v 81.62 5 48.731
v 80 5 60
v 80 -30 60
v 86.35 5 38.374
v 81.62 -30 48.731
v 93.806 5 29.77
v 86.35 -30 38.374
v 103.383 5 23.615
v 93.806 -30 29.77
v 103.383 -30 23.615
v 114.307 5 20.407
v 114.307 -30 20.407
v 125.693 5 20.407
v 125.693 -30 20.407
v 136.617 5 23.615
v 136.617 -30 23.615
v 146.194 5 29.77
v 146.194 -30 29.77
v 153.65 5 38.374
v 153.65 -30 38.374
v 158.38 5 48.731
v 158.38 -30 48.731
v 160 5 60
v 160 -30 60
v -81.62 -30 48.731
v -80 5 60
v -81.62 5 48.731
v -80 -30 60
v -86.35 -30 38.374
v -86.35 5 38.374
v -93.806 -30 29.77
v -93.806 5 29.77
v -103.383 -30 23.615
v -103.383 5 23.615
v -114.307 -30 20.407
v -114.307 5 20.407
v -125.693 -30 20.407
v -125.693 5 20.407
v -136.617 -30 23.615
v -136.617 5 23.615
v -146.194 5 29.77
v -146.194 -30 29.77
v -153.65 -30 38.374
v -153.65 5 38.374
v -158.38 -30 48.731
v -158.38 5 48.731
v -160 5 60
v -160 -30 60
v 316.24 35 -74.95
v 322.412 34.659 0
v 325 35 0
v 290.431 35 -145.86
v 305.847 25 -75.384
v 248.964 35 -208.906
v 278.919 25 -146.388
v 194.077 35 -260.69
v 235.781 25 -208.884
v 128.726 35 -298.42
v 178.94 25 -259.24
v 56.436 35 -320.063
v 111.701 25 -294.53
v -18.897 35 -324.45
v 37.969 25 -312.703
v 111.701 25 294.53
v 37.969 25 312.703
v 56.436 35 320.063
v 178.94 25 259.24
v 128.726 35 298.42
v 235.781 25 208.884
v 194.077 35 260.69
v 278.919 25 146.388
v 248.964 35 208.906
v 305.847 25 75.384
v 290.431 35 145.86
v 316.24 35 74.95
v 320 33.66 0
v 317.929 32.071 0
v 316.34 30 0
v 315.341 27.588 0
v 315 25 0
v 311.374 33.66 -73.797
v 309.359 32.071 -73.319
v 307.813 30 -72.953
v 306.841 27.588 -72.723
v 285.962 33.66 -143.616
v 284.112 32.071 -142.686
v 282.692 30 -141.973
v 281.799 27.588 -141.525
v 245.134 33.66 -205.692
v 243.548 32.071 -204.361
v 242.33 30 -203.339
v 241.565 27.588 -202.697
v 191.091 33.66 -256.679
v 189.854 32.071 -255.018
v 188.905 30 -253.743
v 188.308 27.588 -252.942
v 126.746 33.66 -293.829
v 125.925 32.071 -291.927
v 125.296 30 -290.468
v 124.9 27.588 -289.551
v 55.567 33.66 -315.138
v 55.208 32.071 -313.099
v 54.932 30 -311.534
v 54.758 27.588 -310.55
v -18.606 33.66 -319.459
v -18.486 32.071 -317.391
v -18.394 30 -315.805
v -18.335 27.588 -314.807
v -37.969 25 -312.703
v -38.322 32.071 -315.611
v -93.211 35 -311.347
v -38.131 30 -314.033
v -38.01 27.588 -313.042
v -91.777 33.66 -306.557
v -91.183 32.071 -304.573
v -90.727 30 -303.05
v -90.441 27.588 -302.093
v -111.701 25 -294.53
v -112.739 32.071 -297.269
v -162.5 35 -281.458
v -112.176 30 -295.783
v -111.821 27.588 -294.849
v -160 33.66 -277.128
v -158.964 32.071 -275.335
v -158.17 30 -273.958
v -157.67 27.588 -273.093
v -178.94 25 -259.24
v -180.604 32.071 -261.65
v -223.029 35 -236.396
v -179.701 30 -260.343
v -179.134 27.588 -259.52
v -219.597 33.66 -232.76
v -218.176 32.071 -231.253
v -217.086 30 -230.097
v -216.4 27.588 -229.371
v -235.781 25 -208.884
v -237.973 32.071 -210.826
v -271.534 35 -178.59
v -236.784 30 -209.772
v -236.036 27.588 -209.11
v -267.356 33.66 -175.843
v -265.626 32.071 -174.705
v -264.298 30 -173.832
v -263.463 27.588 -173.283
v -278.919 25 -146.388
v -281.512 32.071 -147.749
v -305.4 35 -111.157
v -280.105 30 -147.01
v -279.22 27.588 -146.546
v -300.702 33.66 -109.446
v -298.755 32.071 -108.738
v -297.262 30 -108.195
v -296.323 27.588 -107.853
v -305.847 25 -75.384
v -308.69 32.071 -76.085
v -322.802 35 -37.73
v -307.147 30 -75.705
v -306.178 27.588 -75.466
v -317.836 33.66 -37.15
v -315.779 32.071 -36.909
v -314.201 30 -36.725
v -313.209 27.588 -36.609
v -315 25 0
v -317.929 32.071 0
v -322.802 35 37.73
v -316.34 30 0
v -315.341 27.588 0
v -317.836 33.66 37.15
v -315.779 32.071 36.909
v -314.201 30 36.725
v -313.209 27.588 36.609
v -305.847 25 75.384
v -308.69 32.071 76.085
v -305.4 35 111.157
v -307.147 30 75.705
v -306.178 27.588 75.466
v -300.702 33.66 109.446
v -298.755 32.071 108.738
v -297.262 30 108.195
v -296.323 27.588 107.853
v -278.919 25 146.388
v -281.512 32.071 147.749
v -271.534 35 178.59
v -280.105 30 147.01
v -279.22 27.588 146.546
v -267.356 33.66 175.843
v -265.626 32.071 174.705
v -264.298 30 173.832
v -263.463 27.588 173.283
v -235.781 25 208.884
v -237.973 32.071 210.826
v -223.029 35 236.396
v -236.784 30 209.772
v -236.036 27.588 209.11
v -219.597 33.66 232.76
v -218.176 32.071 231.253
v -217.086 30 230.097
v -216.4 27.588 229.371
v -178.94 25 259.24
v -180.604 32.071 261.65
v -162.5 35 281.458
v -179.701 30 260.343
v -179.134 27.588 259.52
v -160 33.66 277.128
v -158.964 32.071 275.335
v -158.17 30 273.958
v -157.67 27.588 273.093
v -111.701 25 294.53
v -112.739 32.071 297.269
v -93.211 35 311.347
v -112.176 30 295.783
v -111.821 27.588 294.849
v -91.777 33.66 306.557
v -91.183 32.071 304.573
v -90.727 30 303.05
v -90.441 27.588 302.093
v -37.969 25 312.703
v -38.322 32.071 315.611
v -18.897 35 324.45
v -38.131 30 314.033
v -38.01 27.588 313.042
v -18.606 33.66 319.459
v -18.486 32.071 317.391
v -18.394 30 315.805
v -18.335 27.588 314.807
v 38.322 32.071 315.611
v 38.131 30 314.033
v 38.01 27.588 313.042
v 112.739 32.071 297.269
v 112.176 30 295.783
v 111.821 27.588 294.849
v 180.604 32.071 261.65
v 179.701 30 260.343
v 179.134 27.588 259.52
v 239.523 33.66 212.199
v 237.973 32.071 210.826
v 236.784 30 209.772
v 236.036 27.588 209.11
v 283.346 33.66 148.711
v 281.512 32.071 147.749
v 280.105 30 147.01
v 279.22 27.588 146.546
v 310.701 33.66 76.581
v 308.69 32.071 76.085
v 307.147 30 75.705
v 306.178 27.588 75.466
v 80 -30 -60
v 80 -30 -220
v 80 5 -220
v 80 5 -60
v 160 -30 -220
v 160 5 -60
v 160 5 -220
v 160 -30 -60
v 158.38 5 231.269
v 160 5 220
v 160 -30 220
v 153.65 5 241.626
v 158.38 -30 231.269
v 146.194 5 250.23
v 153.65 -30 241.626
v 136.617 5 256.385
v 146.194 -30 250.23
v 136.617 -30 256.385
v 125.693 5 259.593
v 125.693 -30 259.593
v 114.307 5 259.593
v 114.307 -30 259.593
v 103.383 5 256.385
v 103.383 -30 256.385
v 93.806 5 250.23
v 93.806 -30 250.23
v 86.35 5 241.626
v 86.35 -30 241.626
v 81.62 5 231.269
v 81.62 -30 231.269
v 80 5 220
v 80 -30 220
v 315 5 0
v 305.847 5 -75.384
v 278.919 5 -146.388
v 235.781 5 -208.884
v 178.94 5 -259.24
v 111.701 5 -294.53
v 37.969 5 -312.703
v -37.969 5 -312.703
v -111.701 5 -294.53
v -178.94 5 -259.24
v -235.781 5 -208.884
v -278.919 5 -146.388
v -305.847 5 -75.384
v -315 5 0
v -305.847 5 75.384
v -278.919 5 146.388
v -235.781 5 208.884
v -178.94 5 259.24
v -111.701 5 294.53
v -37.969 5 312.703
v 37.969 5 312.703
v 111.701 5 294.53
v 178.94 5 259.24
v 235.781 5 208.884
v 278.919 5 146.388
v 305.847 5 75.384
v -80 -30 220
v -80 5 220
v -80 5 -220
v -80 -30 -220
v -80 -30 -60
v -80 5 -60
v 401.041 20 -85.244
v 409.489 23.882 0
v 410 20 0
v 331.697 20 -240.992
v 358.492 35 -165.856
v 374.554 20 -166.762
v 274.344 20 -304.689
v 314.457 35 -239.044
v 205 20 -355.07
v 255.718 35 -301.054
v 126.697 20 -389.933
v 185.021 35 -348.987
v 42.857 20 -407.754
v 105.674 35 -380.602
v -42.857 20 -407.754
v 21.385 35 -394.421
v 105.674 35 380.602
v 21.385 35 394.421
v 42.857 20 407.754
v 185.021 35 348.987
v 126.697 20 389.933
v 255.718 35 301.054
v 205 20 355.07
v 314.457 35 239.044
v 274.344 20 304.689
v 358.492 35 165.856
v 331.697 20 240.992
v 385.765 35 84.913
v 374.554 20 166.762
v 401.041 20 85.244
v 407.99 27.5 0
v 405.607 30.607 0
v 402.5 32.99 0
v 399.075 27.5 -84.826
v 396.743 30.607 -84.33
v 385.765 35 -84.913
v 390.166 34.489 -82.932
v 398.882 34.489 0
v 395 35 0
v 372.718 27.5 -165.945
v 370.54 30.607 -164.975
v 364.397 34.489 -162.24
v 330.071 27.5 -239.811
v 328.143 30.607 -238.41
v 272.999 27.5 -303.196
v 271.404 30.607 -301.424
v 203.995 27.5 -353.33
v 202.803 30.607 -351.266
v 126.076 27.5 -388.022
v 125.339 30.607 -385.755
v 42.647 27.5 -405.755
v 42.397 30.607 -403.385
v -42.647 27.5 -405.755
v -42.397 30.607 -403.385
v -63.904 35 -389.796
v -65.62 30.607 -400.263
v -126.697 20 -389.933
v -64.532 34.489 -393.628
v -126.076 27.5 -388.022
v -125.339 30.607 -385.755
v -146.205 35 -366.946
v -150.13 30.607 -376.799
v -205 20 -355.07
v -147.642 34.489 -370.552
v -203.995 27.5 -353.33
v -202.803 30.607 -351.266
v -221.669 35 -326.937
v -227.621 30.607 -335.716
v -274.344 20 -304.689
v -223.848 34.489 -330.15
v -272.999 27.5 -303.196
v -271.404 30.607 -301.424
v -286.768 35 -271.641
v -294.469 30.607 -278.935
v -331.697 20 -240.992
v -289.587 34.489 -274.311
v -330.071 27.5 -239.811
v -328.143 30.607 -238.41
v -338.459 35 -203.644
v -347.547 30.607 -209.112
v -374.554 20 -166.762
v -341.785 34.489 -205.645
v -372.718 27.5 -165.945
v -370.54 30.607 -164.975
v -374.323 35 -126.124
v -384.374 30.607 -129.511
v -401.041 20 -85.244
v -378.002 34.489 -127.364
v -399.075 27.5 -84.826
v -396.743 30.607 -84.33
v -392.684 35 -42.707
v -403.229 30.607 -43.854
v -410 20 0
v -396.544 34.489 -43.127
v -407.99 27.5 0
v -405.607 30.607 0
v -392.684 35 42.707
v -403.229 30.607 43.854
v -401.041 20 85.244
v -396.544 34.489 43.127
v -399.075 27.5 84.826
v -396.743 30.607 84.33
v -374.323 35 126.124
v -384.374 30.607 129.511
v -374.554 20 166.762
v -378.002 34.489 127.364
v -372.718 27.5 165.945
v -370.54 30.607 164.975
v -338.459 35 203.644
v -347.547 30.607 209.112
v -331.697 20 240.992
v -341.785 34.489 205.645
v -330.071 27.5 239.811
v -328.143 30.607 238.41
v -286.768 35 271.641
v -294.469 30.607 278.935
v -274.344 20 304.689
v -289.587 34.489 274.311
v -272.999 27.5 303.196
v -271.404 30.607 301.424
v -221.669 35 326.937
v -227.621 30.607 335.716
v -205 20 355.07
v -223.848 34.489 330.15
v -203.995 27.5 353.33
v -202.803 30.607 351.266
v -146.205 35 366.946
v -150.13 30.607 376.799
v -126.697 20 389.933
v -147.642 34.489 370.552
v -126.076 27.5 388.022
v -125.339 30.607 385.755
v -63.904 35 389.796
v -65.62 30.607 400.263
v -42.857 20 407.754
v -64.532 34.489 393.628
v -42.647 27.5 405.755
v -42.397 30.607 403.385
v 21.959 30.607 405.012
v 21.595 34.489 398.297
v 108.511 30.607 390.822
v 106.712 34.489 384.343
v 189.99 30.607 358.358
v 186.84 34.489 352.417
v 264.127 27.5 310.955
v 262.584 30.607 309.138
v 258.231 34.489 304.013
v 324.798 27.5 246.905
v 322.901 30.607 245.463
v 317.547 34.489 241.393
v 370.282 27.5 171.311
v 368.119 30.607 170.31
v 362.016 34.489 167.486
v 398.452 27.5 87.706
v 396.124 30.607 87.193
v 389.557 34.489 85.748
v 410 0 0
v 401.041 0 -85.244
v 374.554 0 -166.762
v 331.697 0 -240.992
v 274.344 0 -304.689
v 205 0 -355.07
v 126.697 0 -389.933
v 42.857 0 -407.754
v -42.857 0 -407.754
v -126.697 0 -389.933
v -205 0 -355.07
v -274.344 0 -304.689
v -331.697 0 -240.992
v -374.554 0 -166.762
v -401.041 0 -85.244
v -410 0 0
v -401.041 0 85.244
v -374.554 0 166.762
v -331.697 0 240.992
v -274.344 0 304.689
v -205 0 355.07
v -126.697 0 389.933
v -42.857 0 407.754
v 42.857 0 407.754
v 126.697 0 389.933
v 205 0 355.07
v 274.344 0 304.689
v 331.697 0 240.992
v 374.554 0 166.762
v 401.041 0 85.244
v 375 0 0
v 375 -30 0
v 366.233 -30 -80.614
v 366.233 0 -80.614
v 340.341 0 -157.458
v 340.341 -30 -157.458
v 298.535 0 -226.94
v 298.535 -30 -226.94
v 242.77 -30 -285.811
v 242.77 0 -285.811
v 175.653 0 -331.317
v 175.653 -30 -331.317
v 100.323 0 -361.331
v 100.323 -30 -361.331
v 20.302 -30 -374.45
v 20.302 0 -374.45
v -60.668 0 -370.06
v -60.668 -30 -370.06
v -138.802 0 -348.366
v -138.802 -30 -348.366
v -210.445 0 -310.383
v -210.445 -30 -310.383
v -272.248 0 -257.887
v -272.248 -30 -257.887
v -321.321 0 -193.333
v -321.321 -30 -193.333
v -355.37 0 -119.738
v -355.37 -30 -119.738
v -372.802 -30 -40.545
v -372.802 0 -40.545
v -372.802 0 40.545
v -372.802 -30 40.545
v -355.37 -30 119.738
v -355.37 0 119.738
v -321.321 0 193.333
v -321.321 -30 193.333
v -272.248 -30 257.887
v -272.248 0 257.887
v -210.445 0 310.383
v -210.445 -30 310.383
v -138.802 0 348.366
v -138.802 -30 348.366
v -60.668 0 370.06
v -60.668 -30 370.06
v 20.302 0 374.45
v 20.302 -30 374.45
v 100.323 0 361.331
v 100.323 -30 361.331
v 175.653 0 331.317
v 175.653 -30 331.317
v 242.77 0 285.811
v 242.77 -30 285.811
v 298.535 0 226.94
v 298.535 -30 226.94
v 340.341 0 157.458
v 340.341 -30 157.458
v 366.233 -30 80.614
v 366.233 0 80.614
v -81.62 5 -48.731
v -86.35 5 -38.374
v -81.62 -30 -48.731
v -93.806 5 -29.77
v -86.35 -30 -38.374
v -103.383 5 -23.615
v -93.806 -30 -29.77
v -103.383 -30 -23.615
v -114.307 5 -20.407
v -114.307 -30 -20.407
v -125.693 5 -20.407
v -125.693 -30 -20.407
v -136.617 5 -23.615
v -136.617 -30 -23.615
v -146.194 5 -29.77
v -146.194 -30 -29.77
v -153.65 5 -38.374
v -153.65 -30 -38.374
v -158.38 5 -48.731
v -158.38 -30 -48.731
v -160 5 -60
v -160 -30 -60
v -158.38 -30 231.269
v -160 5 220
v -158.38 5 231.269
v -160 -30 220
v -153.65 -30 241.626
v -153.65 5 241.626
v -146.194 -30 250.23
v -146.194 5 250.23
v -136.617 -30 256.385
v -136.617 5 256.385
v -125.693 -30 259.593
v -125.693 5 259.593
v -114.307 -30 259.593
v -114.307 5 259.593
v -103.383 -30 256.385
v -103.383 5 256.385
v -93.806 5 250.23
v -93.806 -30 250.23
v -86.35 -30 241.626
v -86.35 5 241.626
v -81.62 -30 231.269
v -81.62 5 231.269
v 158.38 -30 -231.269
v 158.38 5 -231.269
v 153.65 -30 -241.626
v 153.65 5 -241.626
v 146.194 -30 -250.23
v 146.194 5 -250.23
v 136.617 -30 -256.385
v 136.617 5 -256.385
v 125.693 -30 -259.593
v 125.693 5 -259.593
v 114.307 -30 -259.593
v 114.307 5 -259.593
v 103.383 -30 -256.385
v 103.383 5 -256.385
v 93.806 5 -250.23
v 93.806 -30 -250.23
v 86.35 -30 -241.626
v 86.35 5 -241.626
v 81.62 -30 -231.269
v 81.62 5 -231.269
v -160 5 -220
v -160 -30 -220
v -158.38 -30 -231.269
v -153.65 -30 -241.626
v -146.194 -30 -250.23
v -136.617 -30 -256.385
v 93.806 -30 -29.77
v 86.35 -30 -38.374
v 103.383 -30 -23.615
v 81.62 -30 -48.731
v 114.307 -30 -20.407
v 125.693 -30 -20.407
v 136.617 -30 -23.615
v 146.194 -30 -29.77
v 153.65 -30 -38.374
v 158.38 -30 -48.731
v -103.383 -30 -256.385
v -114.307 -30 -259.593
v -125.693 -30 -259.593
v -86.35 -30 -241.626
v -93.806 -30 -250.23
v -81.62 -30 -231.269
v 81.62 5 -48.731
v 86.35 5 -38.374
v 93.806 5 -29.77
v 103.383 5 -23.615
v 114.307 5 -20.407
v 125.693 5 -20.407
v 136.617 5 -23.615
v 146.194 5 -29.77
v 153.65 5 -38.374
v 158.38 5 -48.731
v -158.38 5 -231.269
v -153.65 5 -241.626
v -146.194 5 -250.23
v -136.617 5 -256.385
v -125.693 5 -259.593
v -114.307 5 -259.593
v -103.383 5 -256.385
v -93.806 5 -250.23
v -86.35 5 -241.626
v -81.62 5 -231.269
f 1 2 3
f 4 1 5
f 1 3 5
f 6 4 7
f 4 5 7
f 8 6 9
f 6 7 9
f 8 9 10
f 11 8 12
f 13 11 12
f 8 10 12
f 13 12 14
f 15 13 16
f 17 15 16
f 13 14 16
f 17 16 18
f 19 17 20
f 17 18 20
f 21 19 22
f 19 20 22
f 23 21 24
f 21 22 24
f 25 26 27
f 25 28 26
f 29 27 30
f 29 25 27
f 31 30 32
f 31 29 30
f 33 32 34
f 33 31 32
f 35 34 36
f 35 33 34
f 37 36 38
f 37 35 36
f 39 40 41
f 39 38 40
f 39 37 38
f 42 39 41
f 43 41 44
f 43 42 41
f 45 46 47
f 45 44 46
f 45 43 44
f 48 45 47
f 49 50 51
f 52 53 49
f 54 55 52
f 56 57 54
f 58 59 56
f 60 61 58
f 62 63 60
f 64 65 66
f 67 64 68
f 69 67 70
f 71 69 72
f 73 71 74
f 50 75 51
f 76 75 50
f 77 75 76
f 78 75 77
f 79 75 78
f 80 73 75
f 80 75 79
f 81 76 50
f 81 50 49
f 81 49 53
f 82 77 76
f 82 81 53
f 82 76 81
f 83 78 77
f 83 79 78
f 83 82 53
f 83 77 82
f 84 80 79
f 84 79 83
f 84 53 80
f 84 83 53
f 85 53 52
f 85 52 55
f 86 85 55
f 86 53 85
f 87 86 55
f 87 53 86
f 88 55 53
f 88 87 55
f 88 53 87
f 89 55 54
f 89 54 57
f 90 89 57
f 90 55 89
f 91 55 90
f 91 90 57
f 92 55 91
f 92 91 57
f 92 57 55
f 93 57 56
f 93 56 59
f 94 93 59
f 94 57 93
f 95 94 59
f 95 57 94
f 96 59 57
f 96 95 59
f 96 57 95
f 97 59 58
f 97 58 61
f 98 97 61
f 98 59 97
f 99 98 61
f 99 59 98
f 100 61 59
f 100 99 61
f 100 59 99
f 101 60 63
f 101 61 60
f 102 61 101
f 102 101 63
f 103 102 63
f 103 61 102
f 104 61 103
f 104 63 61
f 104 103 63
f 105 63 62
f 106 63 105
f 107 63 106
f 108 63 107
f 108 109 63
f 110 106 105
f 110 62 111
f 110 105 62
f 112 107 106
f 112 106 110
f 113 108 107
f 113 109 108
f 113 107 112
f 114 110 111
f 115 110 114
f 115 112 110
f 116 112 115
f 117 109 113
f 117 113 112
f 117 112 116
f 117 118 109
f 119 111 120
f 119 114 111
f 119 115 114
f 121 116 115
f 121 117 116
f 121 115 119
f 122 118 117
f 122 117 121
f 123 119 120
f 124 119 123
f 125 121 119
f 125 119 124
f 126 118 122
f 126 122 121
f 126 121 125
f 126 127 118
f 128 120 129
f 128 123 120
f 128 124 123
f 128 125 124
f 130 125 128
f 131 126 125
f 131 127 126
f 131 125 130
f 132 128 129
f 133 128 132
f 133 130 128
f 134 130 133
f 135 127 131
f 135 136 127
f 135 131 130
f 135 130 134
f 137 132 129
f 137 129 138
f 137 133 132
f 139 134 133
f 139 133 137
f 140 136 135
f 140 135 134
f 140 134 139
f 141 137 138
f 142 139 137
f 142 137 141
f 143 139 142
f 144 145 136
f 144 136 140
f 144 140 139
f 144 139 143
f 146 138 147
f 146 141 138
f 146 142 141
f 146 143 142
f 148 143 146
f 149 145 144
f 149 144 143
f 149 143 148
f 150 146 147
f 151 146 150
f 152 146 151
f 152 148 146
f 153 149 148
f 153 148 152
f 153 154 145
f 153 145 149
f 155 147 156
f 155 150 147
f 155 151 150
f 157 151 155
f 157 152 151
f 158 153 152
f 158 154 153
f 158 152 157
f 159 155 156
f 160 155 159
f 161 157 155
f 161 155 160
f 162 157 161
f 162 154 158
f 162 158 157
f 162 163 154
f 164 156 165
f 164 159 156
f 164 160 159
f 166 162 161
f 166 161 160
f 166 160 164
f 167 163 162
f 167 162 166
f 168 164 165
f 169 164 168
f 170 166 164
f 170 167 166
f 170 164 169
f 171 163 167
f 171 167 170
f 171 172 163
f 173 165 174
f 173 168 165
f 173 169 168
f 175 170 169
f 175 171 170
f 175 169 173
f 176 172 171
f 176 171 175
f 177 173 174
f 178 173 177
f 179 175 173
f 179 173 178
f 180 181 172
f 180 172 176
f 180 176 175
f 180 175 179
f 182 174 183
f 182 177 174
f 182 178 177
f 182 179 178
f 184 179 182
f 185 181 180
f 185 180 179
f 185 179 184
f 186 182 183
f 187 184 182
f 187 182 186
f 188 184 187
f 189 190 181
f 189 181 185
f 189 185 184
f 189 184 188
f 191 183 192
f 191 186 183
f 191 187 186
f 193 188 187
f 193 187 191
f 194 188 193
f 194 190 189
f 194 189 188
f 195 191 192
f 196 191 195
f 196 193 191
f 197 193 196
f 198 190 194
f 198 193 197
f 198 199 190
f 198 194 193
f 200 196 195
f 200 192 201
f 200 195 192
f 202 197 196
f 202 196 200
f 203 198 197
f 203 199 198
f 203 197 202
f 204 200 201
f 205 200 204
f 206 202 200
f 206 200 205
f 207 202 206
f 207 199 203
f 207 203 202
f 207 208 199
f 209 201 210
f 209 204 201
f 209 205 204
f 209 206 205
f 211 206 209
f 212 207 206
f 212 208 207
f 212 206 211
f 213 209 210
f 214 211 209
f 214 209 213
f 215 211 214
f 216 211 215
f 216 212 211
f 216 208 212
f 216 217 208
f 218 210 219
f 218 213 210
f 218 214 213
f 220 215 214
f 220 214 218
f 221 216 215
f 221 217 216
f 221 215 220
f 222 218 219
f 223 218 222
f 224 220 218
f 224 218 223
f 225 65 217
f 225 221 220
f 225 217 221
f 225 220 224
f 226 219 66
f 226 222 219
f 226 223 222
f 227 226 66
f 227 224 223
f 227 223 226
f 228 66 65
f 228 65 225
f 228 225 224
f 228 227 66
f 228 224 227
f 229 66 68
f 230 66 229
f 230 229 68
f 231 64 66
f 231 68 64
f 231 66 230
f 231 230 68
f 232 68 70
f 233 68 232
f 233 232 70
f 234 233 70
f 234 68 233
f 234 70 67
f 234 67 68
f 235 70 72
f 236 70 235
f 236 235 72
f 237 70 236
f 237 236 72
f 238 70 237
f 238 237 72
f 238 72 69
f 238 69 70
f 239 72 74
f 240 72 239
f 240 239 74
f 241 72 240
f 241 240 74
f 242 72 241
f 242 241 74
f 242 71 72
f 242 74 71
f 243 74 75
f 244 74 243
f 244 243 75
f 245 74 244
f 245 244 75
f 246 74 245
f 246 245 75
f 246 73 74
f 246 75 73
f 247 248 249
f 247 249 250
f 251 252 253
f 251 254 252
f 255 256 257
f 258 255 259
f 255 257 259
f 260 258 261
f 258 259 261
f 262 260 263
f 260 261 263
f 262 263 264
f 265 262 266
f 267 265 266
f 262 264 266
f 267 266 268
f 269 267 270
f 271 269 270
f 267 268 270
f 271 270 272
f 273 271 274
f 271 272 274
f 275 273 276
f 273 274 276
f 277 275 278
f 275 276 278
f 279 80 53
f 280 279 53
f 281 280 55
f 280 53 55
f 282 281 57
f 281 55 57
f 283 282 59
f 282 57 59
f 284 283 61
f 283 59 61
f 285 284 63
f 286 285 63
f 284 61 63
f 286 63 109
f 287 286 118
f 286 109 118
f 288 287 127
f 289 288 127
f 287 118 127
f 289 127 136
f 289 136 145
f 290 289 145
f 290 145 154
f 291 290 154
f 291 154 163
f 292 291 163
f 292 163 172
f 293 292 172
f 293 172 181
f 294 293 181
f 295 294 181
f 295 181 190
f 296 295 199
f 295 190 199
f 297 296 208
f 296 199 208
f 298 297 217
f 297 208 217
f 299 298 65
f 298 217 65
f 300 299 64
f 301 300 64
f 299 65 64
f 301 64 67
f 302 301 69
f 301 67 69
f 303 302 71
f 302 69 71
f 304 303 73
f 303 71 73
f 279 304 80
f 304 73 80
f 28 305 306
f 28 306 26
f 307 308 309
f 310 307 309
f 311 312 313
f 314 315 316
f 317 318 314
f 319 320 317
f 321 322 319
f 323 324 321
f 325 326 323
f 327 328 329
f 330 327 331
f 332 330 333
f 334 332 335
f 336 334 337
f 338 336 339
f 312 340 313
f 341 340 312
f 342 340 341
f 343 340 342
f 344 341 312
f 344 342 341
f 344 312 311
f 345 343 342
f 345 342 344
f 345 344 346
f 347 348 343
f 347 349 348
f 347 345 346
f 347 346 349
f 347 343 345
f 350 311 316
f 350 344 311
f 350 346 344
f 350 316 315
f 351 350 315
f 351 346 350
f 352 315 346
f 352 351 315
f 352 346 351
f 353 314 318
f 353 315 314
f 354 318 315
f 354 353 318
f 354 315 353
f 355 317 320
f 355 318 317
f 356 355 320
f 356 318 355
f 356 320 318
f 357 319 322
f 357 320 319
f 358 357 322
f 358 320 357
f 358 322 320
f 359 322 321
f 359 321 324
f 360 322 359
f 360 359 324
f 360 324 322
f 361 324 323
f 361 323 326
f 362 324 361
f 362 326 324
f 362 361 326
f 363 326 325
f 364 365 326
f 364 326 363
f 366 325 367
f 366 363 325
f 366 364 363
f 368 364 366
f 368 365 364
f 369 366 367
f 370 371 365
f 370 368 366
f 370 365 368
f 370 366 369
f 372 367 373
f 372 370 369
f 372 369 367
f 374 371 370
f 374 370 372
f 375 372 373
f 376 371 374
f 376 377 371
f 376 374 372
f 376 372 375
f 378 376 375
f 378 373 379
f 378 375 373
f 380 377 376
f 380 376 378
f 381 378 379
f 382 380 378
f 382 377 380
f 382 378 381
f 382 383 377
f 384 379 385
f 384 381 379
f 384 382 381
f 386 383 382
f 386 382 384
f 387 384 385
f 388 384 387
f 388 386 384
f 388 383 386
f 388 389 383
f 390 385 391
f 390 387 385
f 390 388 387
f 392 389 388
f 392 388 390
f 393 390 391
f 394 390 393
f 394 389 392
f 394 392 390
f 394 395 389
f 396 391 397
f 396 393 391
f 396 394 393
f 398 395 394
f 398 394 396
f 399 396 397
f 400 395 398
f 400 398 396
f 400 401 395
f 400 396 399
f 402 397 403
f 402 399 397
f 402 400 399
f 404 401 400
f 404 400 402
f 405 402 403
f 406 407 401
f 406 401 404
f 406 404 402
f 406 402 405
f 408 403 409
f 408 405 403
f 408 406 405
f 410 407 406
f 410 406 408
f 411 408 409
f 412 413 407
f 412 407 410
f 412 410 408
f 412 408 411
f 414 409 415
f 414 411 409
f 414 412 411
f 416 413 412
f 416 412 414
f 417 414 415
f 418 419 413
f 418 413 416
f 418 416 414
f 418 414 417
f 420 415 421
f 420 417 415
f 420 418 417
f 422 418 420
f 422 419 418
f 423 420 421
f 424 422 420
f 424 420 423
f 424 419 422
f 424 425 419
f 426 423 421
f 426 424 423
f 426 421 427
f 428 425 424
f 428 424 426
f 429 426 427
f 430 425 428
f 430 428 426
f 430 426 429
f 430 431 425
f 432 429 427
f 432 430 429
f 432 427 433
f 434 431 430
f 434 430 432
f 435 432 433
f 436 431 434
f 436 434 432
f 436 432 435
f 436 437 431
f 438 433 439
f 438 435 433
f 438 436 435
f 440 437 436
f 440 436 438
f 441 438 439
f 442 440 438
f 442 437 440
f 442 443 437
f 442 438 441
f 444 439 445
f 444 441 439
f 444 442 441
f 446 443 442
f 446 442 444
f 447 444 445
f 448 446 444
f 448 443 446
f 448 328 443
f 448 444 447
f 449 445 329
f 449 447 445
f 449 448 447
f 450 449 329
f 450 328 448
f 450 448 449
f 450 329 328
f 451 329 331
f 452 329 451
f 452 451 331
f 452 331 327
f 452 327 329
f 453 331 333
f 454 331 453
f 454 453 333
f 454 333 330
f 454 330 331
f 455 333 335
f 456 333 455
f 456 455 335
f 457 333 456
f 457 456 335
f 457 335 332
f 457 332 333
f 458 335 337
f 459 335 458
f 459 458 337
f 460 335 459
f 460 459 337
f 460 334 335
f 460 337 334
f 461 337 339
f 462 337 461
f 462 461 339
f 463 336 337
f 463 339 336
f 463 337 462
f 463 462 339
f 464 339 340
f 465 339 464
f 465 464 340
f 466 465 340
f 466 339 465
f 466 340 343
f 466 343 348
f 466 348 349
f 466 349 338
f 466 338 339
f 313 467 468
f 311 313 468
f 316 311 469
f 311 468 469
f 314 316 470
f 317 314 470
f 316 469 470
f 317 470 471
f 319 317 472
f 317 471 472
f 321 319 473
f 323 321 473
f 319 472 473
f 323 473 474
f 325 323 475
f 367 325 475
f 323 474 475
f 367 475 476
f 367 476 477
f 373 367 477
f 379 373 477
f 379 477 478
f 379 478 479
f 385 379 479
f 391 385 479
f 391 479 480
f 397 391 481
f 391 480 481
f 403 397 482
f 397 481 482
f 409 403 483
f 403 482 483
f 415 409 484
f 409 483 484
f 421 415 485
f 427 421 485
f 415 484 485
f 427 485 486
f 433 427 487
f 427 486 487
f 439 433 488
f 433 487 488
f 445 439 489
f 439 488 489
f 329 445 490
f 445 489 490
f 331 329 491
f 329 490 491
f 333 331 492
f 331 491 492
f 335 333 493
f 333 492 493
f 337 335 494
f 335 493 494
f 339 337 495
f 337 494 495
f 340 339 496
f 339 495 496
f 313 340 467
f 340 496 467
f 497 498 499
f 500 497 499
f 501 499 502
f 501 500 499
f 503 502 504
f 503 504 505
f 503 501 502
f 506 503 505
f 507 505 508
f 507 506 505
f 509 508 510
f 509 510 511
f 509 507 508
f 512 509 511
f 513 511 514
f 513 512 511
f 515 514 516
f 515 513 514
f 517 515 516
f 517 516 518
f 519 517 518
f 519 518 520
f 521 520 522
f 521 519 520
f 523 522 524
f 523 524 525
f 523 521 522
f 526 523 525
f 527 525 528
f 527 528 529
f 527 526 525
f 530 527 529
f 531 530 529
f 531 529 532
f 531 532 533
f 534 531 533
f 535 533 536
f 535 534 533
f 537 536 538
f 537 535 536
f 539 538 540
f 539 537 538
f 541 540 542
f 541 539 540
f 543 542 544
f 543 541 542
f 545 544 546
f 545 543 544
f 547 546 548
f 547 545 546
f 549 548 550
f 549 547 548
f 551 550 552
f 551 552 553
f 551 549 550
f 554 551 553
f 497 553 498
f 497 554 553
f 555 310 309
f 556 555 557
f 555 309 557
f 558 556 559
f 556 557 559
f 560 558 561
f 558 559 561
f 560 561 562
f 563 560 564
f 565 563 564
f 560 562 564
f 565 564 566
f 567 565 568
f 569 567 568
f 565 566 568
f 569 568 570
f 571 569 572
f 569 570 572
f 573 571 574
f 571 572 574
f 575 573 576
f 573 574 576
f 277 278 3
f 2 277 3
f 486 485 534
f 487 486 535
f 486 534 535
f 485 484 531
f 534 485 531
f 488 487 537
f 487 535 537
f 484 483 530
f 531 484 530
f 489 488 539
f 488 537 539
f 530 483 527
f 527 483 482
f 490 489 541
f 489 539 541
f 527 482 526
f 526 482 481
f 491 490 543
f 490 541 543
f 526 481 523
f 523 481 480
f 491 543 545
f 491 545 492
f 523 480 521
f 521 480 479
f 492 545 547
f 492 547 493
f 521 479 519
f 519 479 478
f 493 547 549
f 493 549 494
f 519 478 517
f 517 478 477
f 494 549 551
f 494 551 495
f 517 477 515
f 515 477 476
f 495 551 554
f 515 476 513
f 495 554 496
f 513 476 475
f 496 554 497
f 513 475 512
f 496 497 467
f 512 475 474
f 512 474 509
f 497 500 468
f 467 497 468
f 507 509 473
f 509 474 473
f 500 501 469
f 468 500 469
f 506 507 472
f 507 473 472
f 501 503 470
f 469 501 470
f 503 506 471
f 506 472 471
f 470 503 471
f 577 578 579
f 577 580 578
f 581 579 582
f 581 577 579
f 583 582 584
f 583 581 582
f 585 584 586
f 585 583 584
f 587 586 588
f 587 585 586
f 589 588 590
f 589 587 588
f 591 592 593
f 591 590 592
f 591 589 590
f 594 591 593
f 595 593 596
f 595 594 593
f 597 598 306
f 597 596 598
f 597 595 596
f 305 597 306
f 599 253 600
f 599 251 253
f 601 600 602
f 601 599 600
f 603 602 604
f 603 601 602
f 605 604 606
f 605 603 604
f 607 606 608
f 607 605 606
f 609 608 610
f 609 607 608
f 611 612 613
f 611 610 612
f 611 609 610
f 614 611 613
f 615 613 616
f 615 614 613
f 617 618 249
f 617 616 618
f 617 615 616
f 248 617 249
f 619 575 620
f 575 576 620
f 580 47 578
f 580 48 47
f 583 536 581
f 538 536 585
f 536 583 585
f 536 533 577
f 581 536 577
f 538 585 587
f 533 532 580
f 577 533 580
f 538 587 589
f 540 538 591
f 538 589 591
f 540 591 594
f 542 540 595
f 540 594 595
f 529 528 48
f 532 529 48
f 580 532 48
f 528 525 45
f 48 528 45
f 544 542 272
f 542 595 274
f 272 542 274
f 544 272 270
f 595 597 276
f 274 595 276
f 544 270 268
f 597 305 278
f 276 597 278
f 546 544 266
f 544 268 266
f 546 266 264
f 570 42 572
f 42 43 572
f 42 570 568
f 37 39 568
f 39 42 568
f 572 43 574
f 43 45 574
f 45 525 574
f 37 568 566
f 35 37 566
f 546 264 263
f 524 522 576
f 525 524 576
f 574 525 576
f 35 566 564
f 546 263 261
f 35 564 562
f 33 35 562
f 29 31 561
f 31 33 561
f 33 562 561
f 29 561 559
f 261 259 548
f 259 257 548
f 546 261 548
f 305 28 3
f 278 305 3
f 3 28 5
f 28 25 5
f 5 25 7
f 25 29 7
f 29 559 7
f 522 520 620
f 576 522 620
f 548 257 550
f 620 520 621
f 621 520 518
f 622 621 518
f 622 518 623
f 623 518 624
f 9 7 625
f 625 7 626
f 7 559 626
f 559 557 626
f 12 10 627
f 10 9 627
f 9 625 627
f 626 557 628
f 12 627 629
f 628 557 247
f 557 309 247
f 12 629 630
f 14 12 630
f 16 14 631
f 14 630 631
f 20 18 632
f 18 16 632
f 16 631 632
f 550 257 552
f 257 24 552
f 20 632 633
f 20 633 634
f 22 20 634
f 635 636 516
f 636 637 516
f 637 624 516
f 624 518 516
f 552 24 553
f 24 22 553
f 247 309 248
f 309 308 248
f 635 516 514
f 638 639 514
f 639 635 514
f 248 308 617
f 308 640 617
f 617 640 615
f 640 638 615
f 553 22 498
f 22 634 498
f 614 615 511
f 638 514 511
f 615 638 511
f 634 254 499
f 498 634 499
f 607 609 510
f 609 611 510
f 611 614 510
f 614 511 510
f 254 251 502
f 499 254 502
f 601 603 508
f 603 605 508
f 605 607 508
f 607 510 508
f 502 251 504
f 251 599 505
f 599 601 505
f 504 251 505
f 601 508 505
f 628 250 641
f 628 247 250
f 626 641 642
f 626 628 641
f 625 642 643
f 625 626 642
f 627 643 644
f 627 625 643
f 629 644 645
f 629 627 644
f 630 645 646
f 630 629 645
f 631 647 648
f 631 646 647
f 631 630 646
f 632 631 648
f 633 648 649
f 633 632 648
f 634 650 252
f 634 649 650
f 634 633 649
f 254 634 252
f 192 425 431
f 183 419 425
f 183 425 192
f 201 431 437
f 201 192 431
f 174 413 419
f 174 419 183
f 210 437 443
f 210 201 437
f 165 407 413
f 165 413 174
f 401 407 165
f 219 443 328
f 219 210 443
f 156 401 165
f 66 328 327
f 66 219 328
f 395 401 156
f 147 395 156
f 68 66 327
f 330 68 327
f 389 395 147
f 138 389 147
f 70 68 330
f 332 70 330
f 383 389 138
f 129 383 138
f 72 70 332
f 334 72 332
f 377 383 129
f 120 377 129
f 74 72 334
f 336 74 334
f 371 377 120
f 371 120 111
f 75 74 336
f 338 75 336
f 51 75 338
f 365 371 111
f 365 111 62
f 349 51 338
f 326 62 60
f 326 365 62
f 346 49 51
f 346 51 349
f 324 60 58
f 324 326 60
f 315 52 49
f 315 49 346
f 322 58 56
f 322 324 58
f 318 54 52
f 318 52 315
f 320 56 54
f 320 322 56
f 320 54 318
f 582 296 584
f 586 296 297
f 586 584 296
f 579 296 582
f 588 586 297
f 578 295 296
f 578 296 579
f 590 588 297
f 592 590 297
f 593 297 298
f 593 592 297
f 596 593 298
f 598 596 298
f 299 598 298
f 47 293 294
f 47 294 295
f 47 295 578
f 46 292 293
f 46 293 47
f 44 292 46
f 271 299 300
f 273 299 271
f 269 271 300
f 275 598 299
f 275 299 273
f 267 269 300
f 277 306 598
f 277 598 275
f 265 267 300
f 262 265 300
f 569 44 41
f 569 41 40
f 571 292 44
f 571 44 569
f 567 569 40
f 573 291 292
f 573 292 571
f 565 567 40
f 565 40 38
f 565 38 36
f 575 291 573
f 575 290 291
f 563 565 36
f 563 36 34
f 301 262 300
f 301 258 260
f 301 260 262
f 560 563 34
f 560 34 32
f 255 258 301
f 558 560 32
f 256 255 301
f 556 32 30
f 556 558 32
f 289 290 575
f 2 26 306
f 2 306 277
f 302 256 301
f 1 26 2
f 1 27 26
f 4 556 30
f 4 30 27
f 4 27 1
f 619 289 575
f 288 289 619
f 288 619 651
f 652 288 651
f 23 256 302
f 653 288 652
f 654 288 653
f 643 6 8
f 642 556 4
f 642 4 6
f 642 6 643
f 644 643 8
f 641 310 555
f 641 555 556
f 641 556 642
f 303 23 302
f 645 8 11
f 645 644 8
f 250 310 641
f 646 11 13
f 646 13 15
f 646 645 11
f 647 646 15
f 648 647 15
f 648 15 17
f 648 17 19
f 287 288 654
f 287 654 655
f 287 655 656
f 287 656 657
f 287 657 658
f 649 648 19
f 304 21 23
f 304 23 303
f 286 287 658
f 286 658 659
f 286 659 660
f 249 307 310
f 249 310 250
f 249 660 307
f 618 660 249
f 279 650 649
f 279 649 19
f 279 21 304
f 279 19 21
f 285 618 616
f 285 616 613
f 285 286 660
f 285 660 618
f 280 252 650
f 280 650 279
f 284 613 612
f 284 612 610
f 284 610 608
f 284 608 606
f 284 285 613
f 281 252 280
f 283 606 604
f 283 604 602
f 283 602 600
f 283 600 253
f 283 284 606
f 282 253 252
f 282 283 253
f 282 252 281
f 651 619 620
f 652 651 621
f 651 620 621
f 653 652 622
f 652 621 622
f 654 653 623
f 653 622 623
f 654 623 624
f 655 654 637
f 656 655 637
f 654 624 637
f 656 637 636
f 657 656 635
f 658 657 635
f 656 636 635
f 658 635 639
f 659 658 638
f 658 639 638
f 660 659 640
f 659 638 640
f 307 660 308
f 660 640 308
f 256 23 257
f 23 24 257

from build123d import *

# Parameters (mm, degrees)
SKETCH1_R               = 375
BOSS_EXTRUDE1_DEPTH     = 30
SKETCH1_7_R             = 410
BOSS_EXTRUDE2_DEPTH     = 35
CUT_EXTRUDE1_DEPTH      = 36
CUT_EXTRUDE1_DEPTH_BACK = 31
CUT_EXTRUDE2_START      = 35
SKETCH1_14_R            = 315
CUT_EXTRUDE2_DEPTH      = 30
FILLET1_R               = 15
FILLET2_R               = 10


with BuildPart() as part:
    # Sketch1 → Boss-Extrude1 (new body)
    with BuildSketch(Plane(origin=(0, 0, 0), x_dir=(1, 0, 0), z_dir=(0, 1, 0))):
        Circle(SKETCH1_R)
    extrude(amount=-BOSS_EXTRUDE1_DEPTH)

    # Sketch1<7> → Boss-Extrude2 (add)
    with BuildSketch(Plane(origin=(0, 0, 0), x_dir=(1, 0, 0), z_dir=(0, 1, 0))):
        Circle(SKETCH1_7_R)
    extrude(amount=BOSS_EXTRUDE2_DEPTH)

    # Sketch1<10> → Cut-Extrude1 (cut, two sides)
    with BuildSketch(Plane(origin=(0, 0, 0), x_dir=(1, 0, 0), z_dir=(0, 1, 0))) as cut_extrude1_sk:
        with BuildLine():
            Line((-80, 220), (-80, 60))
            ThreePointArc((-80, 60), (-120, 20), (-160, 60))
            Line((-160, 60), (-160, 220))
            ThreePointArc((-160, 220), (-120, 260), (-80, 220))
        make_face()
        with BuildLine():
            Line((-80, -220), (-80, -60))
            ThreePointArc((-80, -60), (-120, -20), (-160, -60))
            Line((-160, -60), (-160, -220))
            ThreePointArc((-160, -220), (-120, -260), (-80, -220))
        make_face()
        with BuildLine():
            Line((80, 220), (80, 60))
            ThreePointArc((80, 60), (120, 20), (160, 60))
            Line((160, 60), (160, 220))
            ThreePointArc((160, 220), (120, 260), (80, 220))
        make_face()
        with BuildLine():
            Line((80, -220), (80, -60))
            ThreePointArc((80, -60), (120, -20), (160, -60))
            Line((160, -60), (160, -220))
            ThreePointArc((160, -220), (120, -260), (80, -220))
        make_face()
    extrude(amount=CUT_EXTRUDE1_DEPTH, mode=Mode.SUBTRACT)
    extrude(cut_extrude1_sk.sketch, amount=-CUT_EXTRUDE1_DEPTH_BACK, mode=Mode.SUBTRACT)

    # Sketch1<14> → Cut-Extrude2 (cut)
    with BuildSketch(Plane(origin=(0, 0, 0), x_dir=(1, 0, 0), z_dir=(0, 1, 0)).offset(CUT_EXTRUDE2_START)):
        Circle(SKETCH1_14_R)
    extrude(amount=-CUT_EXTRUDE2_DEPTH, mode=Mode.SUBTRACT)

    # Fillet1
    fillet1_edges = [part.edges().sort_by_distance(p)[0] for p in [
        (-410, 35, 0),
    ]]
    fillet(fillet1_edges, radius=FILLET1_R)

    # Fillet2
    fillet2_edges = [part.edges().sort_by_distance(p)[0] for p in [
        (-315, 35, 0),
    ]]
    fillet(fillet2_edges, radius=FILLET2_R)


solid = part.part
